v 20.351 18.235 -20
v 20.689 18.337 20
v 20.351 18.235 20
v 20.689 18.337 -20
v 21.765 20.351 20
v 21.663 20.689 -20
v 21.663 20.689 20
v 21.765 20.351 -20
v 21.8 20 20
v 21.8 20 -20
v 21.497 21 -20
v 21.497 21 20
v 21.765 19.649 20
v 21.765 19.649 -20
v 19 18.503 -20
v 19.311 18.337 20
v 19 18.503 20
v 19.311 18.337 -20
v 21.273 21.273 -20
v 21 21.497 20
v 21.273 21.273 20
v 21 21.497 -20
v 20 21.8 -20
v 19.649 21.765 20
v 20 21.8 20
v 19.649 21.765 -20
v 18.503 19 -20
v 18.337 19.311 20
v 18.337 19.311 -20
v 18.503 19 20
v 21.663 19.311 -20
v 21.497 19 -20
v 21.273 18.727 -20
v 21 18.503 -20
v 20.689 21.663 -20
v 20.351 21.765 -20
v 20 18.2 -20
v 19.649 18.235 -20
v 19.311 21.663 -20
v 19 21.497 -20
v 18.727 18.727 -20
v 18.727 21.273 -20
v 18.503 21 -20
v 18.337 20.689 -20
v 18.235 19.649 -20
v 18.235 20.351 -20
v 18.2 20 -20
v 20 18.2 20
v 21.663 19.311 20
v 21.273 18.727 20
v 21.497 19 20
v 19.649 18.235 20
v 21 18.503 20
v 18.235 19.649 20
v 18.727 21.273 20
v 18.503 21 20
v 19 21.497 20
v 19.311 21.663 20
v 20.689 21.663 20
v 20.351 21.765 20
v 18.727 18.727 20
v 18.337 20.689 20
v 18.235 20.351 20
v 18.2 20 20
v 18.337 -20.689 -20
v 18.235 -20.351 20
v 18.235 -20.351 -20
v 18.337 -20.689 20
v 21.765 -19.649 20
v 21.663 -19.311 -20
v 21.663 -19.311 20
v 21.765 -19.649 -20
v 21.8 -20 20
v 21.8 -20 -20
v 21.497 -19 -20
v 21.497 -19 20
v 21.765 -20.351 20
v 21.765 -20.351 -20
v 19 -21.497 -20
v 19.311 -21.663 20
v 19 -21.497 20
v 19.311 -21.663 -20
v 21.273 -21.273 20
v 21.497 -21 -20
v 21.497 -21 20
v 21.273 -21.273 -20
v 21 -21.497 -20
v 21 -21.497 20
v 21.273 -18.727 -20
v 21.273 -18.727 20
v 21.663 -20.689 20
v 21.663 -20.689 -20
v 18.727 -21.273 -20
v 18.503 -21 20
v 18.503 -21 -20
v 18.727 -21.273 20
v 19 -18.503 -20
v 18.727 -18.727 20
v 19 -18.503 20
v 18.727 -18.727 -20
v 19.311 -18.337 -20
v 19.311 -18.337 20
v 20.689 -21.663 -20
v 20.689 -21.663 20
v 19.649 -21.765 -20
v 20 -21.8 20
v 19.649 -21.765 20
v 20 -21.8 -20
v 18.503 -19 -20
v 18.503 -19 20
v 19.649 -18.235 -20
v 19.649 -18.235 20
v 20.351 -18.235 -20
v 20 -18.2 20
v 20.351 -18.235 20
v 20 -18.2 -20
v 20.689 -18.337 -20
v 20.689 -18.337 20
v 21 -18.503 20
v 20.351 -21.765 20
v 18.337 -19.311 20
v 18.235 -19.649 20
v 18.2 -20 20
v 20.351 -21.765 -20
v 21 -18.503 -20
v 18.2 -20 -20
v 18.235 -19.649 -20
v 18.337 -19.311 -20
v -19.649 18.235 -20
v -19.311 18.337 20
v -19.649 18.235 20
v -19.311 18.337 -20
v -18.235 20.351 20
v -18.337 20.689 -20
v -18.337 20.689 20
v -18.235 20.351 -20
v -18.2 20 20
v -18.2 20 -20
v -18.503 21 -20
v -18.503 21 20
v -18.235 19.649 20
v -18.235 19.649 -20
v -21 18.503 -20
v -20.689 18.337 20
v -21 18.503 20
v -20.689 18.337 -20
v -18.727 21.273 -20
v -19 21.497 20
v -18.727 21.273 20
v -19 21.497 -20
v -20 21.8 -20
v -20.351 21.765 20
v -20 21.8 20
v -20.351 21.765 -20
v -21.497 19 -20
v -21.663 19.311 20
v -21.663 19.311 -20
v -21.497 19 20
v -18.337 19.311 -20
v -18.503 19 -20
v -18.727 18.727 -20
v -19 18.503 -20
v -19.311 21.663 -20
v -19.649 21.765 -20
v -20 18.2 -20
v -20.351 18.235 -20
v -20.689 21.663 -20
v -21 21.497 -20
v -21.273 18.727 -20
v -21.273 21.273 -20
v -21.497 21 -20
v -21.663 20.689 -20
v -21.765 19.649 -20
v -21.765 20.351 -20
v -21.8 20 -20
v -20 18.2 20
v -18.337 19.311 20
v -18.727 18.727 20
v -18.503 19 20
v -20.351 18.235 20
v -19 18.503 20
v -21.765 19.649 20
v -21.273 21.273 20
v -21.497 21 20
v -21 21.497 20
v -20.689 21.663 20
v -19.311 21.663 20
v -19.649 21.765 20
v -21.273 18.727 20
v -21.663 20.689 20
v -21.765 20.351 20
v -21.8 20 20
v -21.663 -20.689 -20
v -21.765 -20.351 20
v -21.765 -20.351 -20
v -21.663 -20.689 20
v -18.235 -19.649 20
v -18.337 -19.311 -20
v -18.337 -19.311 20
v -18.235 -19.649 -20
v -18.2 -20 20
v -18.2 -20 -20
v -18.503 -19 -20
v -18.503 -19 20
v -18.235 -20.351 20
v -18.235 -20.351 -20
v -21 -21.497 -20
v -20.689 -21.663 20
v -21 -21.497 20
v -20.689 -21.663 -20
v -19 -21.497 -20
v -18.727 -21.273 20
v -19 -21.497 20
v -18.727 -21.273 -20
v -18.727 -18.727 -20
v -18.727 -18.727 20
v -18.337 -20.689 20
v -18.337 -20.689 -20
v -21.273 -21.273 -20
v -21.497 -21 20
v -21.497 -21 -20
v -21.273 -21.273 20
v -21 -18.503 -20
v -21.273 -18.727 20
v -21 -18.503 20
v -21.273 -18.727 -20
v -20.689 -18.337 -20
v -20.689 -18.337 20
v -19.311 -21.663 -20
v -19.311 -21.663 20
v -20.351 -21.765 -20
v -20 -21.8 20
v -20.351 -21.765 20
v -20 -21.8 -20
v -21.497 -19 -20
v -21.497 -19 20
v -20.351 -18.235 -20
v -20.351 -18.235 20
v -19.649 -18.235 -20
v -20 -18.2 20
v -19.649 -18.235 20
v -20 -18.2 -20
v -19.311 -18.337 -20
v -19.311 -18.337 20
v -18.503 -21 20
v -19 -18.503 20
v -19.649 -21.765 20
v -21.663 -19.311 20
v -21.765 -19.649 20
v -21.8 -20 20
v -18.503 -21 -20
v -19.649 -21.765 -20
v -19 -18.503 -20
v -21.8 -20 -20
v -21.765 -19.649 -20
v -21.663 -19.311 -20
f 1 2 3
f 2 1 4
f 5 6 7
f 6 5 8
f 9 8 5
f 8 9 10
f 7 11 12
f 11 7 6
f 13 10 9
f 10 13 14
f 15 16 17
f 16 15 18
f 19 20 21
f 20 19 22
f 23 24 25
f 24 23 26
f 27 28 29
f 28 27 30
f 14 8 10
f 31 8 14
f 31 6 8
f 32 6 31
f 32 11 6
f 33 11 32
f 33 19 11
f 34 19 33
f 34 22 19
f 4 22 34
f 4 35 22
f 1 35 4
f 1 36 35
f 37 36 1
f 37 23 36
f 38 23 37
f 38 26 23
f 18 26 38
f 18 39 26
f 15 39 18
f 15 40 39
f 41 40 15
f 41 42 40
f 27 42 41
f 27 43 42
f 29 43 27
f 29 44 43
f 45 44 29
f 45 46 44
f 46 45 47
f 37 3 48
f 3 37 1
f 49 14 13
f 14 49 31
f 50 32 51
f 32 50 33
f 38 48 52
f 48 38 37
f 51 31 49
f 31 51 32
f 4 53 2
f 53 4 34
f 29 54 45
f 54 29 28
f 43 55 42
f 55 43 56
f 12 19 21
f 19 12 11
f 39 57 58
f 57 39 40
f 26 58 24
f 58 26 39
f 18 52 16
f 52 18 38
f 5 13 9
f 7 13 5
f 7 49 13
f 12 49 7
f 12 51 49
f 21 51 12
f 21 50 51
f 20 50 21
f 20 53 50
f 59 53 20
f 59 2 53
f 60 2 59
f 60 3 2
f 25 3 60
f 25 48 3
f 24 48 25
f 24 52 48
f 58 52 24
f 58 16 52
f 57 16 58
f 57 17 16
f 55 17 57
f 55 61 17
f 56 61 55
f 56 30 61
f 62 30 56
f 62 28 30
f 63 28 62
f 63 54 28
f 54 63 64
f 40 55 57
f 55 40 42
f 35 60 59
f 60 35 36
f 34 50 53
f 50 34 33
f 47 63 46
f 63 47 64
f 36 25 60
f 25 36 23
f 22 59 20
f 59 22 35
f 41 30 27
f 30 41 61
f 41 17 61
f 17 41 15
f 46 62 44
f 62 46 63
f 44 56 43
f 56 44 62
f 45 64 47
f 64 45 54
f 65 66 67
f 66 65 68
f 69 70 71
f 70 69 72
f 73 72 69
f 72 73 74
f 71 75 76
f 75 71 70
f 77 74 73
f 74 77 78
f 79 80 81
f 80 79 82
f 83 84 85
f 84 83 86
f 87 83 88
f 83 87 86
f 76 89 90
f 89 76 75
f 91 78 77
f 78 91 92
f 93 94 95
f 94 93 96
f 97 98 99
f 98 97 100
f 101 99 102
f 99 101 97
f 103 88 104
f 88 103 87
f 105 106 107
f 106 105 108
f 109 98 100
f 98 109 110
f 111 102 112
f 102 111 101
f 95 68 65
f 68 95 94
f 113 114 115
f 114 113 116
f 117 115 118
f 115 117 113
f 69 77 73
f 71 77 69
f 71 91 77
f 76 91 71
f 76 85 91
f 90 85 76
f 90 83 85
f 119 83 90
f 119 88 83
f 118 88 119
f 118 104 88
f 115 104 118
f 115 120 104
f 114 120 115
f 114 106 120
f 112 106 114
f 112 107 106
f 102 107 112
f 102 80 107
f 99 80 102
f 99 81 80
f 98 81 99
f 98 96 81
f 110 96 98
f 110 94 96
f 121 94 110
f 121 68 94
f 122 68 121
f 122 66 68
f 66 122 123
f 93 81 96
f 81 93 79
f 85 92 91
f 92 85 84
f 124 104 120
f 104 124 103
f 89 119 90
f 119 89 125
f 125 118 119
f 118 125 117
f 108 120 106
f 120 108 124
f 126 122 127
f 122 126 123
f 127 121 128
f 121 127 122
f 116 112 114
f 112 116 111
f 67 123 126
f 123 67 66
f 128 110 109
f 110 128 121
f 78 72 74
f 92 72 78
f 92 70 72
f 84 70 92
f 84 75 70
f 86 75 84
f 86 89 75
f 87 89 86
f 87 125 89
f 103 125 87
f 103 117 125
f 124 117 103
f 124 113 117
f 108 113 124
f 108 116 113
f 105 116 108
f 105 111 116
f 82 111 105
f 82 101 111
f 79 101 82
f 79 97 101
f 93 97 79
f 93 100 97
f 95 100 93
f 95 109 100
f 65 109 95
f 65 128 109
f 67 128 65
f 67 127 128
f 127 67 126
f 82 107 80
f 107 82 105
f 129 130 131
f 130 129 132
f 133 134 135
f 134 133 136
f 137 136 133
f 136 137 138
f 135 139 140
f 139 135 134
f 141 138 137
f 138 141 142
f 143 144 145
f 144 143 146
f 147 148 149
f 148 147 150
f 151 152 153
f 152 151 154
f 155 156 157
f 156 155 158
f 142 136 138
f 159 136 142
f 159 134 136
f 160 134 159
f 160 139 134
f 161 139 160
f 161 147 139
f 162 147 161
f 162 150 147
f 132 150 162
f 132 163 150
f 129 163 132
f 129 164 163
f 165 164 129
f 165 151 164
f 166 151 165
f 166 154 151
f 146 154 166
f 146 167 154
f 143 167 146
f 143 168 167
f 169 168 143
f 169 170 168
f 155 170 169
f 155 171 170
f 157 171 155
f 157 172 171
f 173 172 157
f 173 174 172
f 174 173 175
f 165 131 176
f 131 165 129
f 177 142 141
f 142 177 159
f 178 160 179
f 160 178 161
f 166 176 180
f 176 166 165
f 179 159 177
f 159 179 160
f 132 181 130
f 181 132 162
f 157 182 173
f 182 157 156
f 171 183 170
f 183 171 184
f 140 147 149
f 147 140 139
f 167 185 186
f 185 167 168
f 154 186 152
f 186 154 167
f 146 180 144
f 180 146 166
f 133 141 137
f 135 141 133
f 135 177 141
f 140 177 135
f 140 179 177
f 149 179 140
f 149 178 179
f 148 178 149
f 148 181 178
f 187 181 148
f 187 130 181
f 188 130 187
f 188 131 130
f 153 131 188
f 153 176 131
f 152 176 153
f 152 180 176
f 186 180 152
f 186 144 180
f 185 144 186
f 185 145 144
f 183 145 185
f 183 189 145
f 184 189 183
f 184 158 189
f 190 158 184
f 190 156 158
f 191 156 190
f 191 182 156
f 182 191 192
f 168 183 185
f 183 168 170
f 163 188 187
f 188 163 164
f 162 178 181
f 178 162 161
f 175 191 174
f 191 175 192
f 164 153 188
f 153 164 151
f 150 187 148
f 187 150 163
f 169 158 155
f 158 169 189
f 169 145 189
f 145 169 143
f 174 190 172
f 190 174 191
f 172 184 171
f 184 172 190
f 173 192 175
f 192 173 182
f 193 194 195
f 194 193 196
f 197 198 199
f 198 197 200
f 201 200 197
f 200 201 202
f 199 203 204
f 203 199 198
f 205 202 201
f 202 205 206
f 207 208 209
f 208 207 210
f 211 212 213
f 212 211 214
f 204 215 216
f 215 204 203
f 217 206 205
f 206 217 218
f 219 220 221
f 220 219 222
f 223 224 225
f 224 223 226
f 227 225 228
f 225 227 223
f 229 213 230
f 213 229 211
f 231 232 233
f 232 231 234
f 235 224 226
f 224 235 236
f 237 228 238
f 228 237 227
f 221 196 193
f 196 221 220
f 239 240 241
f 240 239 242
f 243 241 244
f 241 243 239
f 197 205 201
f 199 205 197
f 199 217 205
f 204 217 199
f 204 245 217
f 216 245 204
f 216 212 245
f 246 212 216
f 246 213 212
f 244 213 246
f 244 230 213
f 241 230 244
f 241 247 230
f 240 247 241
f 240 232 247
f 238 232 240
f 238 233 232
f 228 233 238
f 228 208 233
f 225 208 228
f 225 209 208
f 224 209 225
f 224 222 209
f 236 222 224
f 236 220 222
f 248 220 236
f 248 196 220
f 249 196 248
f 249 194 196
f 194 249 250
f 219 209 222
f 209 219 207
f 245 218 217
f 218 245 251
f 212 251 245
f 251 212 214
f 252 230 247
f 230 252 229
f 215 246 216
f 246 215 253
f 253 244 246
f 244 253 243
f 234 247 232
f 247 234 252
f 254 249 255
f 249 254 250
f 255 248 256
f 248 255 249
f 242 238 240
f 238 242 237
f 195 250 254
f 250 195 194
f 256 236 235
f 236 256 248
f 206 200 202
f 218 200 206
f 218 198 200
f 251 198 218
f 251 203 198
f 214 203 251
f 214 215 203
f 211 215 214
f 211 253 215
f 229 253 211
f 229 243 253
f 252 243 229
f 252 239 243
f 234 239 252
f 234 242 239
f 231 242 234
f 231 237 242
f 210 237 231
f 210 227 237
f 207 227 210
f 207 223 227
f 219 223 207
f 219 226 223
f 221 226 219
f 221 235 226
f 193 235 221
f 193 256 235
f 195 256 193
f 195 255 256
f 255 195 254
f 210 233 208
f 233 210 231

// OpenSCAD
boltInterface(40);

module boltInterface(length)
{
    translate([20,20,0])
    cylinder(d=3.6, h=length, center=true, $fn=32);
    translate([20,-20,0])
    cylinder(d=3.6, h=length, center=true, $fn=32);
    translate([-20,20,0])
    cylinder(d=3.6, h=length, center=true, $fn=32);
    translate([-20,-20,0])
    cylinder(d=3.6, h=length, center=true, $fn=32); 
}
    
